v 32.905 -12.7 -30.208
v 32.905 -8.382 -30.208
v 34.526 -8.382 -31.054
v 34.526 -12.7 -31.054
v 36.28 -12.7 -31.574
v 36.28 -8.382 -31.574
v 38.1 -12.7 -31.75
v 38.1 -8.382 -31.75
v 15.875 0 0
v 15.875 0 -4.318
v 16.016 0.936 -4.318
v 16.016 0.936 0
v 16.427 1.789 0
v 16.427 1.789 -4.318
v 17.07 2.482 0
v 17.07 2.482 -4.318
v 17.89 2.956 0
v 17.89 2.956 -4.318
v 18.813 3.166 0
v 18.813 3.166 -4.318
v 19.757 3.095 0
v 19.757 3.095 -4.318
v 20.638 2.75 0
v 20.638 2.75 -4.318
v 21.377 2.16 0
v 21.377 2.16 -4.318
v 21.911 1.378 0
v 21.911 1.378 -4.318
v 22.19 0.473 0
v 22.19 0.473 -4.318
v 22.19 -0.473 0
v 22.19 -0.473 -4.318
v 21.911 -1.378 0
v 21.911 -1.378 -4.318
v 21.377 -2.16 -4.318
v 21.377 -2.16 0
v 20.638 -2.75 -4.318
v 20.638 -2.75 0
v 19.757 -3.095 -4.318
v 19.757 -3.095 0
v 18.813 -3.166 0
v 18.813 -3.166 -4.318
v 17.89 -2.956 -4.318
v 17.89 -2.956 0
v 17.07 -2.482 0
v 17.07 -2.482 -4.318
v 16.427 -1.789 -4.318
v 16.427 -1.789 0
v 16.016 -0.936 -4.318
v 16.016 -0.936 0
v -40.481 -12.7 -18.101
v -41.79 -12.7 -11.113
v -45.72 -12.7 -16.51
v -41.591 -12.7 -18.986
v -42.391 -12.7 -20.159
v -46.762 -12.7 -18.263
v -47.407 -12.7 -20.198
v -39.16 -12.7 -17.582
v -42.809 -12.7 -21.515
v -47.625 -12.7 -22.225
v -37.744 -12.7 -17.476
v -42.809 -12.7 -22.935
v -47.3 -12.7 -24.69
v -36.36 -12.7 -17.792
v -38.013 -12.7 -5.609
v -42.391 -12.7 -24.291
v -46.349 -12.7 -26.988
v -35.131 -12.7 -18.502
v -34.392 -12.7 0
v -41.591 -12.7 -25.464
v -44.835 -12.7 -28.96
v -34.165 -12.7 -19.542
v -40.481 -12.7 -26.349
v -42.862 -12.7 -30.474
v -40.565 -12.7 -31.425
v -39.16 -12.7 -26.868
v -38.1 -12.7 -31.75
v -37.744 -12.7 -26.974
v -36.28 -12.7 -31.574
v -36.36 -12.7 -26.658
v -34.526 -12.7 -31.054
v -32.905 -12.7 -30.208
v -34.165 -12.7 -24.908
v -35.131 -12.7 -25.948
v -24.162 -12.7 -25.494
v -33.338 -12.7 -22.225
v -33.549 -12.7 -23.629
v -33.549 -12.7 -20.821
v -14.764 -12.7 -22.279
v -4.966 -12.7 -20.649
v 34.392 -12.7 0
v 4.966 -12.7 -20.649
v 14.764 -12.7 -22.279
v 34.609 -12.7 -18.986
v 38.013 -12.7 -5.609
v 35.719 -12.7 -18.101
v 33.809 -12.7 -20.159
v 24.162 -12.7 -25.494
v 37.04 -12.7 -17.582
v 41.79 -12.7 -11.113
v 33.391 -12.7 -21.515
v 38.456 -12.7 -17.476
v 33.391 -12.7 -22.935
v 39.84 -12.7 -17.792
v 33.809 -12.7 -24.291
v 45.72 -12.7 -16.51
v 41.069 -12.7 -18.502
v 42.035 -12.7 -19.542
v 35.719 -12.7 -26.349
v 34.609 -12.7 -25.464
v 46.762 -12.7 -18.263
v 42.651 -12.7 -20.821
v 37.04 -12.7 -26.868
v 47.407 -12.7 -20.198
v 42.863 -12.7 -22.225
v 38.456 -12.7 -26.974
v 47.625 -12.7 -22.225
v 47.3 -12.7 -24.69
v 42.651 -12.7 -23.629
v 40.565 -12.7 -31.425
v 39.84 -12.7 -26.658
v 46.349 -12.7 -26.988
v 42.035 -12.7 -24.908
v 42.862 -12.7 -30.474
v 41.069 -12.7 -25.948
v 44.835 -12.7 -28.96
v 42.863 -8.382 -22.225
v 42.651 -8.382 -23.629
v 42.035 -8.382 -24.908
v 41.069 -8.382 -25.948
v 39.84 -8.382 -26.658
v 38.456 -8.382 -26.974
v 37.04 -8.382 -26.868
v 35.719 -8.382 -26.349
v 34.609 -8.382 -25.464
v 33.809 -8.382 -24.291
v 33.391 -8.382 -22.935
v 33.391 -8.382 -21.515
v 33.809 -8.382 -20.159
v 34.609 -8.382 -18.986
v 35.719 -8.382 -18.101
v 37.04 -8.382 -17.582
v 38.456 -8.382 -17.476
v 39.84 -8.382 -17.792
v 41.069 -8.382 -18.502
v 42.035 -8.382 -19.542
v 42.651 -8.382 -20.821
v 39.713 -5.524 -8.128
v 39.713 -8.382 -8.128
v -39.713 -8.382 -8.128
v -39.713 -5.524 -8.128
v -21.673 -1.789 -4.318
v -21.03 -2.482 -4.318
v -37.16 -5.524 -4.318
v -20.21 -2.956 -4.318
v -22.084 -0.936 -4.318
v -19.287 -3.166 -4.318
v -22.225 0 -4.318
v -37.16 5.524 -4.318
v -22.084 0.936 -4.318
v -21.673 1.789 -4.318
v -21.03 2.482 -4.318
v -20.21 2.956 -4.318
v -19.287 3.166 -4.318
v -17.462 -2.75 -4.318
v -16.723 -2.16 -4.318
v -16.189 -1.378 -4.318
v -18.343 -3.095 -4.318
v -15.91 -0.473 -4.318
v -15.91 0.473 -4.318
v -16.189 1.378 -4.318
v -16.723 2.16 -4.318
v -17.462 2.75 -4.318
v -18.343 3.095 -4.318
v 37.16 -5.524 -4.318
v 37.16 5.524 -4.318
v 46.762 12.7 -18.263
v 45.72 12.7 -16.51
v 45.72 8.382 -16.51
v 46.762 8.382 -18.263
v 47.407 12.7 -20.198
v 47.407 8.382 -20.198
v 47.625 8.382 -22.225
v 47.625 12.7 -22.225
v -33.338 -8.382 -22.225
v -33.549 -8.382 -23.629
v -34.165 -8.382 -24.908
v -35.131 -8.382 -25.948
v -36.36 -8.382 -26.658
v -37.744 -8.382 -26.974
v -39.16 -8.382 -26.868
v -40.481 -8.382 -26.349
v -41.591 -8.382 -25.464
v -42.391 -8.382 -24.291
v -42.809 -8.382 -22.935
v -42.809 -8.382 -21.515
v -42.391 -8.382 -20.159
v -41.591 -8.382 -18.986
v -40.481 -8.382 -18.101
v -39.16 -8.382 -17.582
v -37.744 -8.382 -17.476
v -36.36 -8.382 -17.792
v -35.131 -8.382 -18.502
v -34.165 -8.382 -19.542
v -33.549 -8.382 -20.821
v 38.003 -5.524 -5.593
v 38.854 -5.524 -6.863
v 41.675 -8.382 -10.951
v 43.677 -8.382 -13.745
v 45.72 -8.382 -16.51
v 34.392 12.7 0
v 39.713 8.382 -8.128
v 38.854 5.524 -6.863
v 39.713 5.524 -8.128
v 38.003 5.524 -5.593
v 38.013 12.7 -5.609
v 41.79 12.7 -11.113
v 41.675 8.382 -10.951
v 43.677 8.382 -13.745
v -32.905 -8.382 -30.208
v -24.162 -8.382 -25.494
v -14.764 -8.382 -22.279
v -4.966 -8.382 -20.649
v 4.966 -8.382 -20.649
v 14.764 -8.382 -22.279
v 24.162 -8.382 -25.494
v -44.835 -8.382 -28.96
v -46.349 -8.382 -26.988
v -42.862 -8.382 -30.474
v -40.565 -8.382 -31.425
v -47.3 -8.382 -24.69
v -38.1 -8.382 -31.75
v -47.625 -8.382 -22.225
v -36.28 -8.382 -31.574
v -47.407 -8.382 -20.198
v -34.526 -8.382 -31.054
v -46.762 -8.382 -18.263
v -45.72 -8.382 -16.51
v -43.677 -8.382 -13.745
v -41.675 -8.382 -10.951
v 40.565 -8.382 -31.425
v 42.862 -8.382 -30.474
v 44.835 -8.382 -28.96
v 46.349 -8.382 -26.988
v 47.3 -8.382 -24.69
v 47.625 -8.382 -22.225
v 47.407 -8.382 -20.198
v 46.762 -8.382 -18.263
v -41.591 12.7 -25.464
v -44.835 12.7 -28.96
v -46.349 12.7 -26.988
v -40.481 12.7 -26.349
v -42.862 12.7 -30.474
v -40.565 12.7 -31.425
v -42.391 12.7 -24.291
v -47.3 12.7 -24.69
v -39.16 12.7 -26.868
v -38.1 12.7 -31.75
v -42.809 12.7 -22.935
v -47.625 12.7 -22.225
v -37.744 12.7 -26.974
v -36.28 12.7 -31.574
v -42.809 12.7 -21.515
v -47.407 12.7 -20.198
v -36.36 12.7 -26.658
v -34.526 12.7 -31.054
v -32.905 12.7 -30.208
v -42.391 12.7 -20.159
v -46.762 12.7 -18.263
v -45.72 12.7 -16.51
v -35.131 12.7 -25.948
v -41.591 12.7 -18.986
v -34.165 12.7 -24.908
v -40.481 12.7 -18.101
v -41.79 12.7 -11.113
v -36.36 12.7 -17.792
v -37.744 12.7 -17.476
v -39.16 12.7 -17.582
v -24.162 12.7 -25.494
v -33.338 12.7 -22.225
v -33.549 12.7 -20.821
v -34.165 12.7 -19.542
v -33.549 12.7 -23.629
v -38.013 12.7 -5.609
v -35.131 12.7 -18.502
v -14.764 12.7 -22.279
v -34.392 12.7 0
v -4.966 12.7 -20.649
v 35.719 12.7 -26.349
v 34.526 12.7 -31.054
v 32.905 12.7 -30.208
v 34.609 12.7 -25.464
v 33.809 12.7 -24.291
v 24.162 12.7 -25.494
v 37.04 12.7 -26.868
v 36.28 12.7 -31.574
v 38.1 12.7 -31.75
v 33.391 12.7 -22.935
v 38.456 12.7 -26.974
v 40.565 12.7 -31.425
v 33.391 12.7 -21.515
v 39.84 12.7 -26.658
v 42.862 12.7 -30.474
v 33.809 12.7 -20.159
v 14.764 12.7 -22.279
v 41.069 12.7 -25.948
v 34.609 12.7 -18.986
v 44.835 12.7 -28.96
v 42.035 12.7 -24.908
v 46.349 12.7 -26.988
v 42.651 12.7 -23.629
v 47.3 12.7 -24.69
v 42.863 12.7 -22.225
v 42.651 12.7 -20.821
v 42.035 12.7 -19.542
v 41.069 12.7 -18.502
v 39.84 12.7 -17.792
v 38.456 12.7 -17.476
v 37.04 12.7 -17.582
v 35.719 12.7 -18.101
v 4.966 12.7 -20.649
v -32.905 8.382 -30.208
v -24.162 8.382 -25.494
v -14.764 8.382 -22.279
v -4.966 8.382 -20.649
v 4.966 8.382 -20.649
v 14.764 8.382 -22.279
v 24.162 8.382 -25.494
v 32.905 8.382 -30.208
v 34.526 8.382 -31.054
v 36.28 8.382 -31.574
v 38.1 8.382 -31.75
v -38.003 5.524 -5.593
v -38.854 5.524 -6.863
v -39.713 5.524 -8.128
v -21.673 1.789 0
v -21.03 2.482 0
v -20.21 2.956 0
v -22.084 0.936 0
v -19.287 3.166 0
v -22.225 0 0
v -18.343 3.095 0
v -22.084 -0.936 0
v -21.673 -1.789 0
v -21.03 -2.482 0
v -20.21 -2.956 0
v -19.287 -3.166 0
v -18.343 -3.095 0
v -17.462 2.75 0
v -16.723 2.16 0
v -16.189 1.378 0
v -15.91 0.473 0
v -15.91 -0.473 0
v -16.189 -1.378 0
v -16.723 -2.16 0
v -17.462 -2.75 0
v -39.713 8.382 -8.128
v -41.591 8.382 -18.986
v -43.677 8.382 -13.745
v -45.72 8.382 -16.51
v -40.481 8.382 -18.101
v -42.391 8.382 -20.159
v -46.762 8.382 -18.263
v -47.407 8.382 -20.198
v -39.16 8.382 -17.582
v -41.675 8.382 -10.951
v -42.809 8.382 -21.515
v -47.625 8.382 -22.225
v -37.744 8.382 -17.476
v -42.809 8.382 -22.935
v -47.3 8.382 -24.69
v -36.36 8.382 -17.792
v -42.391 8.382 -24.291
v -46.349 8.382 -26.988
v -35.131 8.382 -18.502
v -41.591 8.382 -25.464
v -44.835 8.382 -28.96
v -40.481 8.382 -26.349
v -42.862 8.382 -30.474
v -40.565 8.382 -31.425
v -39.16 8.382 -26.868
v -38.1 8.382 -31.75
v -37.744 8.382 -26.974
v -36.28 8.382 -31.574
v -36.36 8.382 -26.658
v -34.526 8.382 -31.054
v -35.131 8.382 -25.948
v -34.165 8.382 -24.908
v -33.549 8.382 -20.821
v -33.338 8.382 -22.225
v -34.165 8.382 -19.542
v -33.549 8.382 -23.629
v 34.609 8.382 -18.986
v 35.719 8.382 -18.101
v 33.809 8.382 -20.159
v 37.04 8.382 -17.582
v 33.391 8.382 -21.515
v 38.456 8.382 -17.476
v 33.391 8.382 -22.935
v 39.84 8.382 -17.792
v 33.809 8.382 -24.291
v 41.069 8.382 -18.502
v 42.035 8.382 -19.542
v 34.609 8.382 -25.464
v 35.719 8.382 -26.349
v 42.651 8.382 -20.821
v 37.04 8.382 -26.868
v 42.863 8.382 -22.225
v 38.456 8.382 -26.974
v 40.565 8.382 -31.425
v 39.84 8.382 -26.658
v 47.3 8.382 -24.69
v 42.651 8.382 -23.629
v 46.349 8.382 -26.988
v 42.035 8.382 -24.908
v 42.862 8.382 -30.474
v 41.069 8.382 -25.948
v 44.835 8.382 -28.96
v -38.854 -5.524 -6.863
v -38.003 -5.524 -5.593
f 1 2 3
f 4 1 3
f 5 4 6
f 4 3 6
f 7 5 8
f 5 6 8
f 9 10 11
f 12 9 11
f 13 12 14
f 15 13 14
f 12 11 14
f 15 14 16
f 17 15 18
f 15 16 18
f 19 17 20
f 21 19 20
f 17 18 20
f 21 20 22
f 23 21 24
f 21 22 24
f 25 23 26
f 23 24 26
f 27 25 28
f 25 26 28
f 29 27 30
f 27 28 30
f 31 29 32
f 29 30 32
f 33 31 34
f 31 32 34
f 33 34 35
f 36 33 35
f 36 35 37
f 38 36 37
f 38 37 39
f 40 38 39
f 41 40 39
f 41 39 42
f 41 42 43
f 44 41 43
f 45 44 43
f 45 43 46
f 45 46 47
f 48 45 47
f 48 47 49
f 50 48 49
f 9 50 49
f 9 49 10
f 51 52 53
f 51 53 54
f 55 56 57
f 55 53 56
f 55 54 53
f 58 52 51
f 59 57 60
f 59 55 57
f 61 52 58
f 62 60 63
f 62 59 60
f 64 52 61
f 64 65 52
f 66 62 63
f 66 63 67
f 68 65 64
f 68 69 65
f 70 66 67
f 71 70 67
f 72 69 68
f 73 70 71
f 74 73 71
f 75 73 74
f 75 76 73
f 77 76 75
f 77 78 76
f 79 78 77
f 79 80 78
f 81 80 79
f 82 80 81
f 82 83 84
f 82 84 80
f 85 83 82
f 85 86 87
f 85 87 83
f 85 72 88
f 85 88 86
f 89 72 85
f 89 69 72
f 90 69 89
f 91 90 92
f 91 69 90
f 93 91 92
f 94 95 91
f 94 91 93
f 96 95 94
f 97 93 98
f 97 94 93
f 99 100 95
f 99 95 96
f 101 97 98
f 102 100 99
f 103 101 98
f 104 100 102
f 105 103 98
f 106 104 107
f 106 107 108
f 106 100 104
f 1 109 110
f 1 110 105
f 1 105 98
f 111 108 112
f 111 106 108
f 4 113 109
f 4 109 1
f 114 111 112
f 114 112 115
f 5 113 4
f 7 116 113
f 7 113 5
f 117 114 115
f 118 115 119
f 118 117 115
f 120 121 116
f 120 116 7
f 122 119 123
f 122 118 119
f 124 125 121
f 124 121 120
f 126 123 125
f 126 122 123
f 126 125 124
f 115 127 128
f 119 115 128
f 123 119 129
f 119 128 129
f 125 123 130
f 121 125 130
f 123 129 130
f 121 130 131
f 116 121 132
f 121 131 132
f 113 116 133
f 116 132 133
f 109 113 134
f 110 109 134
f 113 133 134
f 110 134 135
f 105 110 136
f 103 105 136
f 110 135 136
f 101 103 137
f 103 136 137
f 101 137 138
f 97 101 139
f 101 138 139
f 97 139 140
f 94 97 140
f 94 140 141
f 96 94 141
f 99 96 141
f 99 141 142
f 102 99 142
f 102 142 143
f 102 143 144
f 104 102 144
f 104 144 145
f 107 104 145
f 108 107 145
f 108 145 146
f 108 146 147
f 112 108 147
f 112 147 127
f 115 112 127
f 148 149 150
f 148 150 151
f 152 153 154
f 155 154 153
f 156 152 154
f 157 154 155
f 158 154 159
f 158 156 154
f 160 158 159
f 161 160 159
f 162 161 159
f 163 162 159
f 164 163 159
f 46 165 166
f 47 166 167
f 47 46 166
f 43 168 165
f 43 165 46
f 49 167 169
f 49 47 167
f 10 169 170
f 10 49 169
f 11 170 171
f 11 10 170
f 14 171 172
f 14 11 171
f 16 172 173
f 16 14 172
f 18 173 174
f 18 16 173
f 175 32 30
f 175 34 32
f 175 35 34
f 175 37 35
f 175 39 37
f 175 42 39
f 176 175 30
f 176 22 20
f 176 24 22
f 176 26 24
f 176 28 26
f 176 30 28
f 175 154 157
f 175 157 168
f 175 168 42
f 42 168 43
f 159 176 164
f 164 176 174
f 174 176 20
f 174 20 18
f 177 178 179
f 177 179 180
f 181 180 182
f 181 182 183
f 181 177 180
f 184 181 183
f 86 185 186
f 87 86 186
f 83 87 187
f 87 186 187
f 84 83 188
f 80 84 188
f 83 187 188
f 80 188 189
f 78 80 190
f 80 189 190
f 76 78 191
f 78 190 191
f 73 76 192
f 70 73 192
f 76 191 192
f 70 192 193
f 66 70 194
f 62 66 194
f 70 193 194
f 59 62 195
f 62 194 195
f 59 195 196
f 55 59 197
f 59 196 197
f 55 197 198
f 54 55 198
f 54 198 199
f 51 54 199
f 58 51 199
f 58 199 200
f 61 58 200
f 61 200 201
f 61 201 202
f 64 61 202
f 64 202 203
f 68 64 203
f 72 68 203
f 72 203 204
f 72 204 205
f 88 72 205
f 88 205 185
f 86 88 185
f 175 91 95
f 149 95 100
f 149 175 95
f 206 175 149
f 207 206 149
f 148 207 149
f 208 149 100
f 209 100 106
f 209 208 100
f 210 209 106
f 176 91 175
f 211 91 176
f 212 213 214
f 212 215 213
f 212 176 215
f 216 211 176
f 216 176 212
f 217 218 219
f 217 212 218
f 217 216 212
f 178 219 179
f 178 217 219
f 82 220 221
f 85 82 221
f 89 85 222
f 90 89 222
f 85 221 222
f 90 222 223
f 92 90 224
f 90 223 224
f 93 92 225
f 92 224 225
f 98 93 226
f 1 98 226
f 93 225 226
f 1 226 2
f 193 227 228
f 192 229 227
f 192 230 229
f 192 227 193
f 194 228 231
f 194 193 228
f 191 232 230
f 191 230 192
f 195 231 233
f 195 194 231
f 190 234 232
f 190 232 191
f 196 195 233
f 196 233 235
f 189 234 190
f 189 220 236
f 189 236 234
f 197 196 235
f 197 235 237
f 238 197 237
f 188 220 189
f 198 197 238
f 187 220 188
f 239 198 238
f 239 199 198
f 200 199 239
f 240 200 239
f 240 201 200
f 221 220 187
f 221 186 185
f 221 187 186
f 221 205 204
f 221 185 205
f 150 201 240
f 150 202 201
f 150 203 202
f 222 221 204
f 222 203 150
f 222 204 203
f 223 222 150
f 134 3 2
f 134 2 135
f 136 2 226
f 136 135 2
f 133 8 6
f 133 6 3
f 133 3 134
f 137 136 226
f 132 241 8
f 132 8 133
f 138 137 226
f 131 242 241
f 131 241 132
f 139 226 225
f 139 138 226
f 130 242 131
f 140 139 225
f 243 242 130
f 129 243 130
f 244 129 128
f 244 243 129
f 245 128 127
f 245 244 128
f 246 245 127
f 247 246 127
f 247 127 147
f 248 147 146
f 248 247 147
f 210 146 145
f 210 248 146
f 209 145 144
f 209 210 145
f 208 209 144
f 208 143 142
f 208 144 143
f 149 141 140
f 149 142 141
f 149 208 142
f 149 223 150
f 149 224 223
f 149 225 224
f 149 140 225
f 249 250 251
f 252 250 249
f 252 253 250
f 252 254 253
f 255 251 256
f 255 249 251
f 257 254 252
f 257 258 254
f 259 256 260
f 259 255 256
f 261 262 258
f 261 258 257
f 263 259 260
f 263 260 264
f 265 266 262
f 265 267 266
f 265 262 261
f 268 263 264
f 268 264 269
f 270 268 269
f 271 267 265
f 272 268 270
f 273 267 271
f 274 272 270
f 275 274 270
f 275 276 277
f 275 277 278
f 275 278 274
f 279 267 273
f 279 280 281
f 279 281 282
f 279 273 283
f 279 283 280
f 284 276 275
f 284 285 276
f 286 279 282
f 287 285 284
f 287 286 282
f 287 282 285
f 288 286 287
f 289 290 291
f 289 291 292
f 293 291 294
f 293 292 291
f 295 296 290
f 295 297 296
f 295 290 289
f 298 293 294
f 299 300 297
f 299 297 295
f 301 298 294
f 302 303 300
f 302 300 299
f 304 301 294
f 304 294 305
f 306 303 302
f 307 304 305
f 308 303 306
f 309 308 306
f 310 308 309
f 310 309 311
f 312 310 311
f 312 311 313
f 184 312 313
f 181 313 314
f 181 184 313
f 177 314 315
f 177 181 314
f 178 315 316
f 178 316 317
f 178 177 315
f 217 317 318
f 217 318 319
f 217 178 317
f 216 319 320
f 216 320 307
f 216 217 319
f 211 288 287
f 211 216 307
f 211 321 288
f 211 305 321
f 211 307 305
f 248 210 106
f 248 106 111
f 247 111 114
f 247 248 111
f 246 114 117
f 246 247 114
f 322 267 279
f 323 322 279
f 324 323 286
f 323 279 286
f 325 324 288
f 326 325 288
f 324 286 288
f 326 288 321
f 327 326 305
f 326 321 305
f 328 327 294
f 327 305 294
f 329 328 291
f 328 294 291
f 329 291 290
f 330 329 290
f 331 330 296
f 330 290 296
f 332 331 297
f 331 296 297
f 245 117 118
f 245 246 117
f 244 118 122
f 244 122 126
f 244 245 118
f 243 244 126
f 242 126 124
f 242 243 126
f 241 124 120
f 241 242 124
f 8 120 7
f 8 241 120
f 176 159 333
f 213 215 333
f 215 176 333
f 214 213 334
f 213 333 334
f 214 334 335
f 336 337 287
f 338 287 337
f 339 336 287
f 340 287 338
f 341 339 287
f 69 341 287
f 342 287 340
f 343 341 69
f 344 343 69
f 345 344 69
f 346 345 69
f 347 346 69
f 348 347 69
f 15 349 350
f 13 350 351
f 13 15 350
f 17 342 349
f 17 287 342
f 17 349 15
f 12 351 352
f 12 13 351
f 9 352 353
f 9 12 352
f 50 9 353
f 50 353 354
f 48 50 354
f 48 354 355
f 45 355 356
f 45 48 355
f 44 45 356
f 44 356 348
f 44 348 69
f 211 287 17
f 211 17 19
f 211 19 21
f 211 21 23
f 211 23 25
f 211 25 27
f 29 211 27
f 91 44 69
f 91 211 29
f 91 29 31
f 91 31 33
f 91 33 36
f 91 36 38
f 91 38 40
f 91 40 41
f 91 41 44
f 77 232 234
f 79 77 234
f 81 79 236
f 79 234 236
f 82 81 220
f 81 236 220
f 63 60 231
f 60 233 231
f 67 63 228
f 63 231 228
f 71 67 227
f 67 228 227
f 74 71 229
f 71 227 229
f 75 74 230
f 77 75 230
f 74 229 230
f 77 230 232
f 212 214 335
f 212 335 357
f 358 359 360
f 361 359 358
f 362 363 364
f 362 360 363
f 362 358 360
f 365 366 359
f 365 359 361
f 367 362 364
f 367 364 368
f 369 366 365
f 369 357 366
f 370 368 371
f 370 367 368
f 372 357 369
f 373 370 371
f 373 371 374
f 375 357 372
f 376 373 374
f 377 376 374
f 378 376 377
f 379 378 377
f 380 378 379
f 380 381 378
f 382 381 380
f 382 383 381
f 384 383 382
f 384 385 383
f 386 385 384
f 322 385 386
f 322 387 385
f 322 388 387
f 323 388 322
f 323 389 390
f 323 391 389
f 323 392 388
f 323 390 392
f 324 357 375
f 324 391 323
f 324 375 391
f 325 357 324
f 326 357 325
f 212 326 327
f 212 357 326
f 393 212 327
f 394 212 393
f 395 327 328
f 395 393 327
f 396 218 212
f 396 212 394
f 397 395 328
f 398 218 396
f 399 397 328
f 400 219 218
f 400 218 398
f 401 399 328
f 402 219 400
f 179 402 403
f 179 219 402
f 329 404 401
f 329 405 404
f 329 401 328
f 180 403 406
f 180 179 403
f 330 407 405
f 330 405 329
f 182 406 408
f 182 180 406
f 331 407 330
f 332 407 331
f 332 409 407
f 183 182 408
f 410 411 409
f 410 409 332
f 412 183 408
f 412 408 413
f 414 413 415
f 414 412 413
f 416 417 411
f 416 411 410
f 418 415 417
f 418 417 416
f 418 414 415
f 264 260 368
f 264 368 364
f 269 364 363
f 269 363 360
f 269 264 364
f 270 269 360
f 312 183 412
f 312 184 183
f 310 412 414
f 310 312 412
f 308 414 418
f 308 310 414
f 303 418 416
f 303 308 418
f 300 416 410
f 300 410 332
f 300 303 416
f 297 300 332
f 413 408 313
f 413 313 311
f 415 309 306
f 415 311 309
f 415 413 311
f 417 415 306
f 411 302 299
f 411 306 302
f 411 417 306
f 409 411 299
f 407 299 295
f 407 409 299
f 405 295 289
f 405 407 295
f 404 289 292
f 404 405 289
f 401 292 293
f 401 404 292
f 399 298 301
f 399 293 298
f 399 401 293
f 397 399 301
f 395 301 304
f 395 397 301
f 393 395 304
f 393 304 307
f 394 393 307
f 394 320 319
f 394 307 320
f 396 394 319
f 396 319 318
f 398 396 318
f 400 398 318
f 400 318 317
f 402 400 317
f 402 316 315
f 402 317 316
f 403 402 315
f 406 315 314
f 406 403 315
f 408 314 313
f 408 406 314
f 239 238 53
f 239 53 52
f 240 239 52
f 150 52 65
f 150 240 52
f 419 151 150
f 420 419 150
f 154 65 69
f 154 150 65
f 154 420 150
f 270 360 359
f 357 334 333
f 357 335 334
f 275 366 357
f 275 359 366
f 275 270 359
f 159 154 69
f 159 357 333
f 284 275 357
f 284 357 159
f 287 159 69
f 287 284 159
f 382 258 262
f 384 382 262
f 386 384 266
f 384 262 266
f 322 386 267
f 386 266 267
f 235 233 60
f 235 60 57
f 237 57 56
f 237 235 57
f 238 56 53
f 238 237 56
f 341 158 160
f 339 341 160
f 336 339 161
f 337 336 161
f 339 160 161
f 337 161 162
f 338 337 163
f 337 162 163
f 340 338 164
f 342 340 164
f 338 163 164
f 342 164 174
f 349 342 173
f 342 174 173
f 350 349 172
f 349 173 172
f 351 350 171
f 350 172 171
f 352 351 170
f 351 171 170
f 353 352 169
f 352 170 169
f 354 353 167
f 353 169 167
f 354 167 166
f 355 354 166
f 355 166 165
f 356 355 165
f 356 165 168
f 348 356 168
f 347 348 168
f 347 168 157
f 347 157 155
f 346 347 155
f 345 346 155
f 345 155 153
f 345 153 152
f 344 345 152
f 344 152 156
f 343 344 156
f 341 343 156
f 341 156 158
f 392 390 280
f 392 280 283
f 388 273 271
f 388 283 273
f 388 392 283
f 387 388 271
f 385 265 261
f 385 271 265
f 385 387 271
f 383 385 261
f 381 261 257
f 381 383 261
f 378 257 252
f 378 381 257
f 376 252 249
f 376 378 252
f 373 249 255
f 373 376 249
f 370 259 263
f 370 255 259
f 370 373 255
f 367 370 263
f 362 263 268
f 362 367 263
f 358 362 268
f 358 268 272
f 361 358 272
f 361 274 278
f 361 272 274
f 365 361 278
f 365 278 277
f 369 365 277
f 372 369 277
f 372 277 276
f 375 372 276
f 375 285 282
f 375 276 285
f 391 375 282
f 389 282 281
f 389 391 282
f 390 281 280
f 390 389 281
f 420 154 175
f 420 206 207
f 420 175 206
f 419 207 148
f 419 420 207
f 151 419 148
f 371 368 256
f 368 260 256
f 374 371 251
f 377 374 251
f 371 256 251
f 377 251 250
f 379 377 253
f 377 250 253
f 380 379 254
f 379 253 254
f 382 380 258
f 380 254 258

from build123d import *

# Parameters (mm, degrees)
EXTRUDE1_DEPTH            = 47.625
SKETCH4_R                 = 4.7625
SPHERICALHOLES_DEPTH      = 13.7
SPHERICALHOLES_DEPTH_BACK = 13.7
FILLET1_R                 = 9.525
SKETCH5_R                 = 3.175
EXTRUDE2_DEPTH            = 5.318
EXTRUDE3_START            = -47.625
SKETCH6_W                 = 3.81
SKETCH6_H                 = 2.8575
EXTRUDE3_DEPTH            = 95.25
CUT_EXTRUDE1_DEPTH        = 26.4
CUT_EXTRUDE3_DEPTH        = 26.4


with BuildPart() as part:
    # Sketch2 → Extrude1 (new body, symmetric)
    with BuildSketch(Plane(origin=(0, 0, 0), x_dir=(0, 0, -1), z_dir=(1, 0, 0))):
        Polygon((4.318, -8.382), (4.318, 8.382), (31.75, 8.382), (31.75, 12.7), (0, 12.7), (0, -12.7), (31.75, -12.7), (31.75, -8.382), align=None)
    extrude(amount=EXTRUDE1_DEPTH, both=True)

    # Sketch4 → SphericalHoles (cut, two sides)
    with BuildSketch(Plane(origin=(0, 0, 0), x_dir=(1, 0, 0), z_dir=(0, 1, 0))) as sphericalholes_sk:
        with Locations((38.1, 22.225)):
            Circle(SKETCH4_R)
        with Locations((-38.1, 22.225)):
            Circle(SKETCH4_R)
    extrude(amount=SPHERICALHOLES_DEPTH, mode=Mode.SUBTRACT)
    extrude(sphericalholes_sk.sketch, amount=-SPHERICALHOLES_DEPTH_BACK, mode=Mode.SUBTRACT)

    # Fillet1
    fillet1_edges = [part.edges().sort_by_distance(p)[0] for p in [
        (-47.625, 10.541, -31.75),
        (47.625, -10.541, -31.75),
        (47.625, 10.541, -31.75),
        (-47.625, -10.541, -31.75),
    ]]
    fillet(fillet1_edges, radius=FILLET1_R)

    # Sketch5 → Extrude2 (cut, through all)
    with BuildSketch(Plane(origin=(0, 0, -4.318), x_dir=(-1, 0, 0), z_dir=(0, 0, -1))):
        with Locations((19.05, 0)):
            Circle(SKETCH5_R)
        with Locations((-19.05, 0)):
            Circle(SKETCH5_R)
    extrude(amount=-EXTRUDE2_DEPTH, mode=Mode.SUBTRACT)

    # Sketch6 → Extrude3 (add)
    with BuildSketch(Plane(origin=(0, 0, 0), x_dir=(0, 0, -1), z_dir=(1, 0, 0)).offset(EXTRUDE3_START)):
        with Locations((6.223, -6.95325)):
            Rectangle(SKETCH6_W, SKETCH6_H)
        with Locations((6.223, 6.95325)):
            Rectangle(SKETCH6_W, SKETCH6_H)
    extrude(amount=EXTRUDE3_DEPTH)

    # Sketch12 → Cut-Extrude1 (cut, through all)
    with BuildSketch(Plane(origin=(0, 12.7, 0), x_dir=(1, 0, 0), z_dir=(0, 1, 0))):
        with BuildLine():
            Line((-34.3916, 0), (-47.625, 0))
            Line((-47.625, 0), (-47.625, 22.225))
            ThreePointArc((-47.625, 22.225), (-47.136208414, 19.212930529), (-45.72, 16.51))
            ThreePointArc((-45.72, 16.51), (-39.881889157, 8.374329594), (-34.3916, 0))
        make_face()
        with BuildLine():
            Line((47.625, 22.225), (47.625, 0))
            Line((47.625, 0), (34.3916, 0))
            ThreePointArc((34.3916, 0), (39.881889157, 8.374329594), (45.72, 16.51))
            ThreePointArc((45.72, 16.51), (47.136208414, 19.212930529), (47.625, 22.225))
        make_face()
    extrude(amount=-CUT_EXTRUDE1_DEPTH, mode=Mode.SUBTRACT)

    # Sketch13 → Cut-Extrude3 (cut, through all)
    with BuildSketch(Plane(origin=(0, 12.7, 0), x_dir=(1, 0, 0), z_dir=(0, 1, 0))):
        with BuildLine():
            Line((38.1, 31.75), (-38.1, 31.75))
            ThreePointArc((-38.1, 31.75), (-35.390312481, 31.356441209), (-32.904545455, 30.20828736))
            ThreePointArc((-32.904545455, 30.20828736), (0, 20.444107304), (32.904545455, 30.20828736))
            ThreePointArc((32.904545455, 30.20828736), (35.390312481, 31.356441209), (38.1, 31.75))
        make_face()
    extrude(amount=-CUT_EXTRUDE3_DEPTH, mode=Mode.SUBTRACT)


solid = part.part
